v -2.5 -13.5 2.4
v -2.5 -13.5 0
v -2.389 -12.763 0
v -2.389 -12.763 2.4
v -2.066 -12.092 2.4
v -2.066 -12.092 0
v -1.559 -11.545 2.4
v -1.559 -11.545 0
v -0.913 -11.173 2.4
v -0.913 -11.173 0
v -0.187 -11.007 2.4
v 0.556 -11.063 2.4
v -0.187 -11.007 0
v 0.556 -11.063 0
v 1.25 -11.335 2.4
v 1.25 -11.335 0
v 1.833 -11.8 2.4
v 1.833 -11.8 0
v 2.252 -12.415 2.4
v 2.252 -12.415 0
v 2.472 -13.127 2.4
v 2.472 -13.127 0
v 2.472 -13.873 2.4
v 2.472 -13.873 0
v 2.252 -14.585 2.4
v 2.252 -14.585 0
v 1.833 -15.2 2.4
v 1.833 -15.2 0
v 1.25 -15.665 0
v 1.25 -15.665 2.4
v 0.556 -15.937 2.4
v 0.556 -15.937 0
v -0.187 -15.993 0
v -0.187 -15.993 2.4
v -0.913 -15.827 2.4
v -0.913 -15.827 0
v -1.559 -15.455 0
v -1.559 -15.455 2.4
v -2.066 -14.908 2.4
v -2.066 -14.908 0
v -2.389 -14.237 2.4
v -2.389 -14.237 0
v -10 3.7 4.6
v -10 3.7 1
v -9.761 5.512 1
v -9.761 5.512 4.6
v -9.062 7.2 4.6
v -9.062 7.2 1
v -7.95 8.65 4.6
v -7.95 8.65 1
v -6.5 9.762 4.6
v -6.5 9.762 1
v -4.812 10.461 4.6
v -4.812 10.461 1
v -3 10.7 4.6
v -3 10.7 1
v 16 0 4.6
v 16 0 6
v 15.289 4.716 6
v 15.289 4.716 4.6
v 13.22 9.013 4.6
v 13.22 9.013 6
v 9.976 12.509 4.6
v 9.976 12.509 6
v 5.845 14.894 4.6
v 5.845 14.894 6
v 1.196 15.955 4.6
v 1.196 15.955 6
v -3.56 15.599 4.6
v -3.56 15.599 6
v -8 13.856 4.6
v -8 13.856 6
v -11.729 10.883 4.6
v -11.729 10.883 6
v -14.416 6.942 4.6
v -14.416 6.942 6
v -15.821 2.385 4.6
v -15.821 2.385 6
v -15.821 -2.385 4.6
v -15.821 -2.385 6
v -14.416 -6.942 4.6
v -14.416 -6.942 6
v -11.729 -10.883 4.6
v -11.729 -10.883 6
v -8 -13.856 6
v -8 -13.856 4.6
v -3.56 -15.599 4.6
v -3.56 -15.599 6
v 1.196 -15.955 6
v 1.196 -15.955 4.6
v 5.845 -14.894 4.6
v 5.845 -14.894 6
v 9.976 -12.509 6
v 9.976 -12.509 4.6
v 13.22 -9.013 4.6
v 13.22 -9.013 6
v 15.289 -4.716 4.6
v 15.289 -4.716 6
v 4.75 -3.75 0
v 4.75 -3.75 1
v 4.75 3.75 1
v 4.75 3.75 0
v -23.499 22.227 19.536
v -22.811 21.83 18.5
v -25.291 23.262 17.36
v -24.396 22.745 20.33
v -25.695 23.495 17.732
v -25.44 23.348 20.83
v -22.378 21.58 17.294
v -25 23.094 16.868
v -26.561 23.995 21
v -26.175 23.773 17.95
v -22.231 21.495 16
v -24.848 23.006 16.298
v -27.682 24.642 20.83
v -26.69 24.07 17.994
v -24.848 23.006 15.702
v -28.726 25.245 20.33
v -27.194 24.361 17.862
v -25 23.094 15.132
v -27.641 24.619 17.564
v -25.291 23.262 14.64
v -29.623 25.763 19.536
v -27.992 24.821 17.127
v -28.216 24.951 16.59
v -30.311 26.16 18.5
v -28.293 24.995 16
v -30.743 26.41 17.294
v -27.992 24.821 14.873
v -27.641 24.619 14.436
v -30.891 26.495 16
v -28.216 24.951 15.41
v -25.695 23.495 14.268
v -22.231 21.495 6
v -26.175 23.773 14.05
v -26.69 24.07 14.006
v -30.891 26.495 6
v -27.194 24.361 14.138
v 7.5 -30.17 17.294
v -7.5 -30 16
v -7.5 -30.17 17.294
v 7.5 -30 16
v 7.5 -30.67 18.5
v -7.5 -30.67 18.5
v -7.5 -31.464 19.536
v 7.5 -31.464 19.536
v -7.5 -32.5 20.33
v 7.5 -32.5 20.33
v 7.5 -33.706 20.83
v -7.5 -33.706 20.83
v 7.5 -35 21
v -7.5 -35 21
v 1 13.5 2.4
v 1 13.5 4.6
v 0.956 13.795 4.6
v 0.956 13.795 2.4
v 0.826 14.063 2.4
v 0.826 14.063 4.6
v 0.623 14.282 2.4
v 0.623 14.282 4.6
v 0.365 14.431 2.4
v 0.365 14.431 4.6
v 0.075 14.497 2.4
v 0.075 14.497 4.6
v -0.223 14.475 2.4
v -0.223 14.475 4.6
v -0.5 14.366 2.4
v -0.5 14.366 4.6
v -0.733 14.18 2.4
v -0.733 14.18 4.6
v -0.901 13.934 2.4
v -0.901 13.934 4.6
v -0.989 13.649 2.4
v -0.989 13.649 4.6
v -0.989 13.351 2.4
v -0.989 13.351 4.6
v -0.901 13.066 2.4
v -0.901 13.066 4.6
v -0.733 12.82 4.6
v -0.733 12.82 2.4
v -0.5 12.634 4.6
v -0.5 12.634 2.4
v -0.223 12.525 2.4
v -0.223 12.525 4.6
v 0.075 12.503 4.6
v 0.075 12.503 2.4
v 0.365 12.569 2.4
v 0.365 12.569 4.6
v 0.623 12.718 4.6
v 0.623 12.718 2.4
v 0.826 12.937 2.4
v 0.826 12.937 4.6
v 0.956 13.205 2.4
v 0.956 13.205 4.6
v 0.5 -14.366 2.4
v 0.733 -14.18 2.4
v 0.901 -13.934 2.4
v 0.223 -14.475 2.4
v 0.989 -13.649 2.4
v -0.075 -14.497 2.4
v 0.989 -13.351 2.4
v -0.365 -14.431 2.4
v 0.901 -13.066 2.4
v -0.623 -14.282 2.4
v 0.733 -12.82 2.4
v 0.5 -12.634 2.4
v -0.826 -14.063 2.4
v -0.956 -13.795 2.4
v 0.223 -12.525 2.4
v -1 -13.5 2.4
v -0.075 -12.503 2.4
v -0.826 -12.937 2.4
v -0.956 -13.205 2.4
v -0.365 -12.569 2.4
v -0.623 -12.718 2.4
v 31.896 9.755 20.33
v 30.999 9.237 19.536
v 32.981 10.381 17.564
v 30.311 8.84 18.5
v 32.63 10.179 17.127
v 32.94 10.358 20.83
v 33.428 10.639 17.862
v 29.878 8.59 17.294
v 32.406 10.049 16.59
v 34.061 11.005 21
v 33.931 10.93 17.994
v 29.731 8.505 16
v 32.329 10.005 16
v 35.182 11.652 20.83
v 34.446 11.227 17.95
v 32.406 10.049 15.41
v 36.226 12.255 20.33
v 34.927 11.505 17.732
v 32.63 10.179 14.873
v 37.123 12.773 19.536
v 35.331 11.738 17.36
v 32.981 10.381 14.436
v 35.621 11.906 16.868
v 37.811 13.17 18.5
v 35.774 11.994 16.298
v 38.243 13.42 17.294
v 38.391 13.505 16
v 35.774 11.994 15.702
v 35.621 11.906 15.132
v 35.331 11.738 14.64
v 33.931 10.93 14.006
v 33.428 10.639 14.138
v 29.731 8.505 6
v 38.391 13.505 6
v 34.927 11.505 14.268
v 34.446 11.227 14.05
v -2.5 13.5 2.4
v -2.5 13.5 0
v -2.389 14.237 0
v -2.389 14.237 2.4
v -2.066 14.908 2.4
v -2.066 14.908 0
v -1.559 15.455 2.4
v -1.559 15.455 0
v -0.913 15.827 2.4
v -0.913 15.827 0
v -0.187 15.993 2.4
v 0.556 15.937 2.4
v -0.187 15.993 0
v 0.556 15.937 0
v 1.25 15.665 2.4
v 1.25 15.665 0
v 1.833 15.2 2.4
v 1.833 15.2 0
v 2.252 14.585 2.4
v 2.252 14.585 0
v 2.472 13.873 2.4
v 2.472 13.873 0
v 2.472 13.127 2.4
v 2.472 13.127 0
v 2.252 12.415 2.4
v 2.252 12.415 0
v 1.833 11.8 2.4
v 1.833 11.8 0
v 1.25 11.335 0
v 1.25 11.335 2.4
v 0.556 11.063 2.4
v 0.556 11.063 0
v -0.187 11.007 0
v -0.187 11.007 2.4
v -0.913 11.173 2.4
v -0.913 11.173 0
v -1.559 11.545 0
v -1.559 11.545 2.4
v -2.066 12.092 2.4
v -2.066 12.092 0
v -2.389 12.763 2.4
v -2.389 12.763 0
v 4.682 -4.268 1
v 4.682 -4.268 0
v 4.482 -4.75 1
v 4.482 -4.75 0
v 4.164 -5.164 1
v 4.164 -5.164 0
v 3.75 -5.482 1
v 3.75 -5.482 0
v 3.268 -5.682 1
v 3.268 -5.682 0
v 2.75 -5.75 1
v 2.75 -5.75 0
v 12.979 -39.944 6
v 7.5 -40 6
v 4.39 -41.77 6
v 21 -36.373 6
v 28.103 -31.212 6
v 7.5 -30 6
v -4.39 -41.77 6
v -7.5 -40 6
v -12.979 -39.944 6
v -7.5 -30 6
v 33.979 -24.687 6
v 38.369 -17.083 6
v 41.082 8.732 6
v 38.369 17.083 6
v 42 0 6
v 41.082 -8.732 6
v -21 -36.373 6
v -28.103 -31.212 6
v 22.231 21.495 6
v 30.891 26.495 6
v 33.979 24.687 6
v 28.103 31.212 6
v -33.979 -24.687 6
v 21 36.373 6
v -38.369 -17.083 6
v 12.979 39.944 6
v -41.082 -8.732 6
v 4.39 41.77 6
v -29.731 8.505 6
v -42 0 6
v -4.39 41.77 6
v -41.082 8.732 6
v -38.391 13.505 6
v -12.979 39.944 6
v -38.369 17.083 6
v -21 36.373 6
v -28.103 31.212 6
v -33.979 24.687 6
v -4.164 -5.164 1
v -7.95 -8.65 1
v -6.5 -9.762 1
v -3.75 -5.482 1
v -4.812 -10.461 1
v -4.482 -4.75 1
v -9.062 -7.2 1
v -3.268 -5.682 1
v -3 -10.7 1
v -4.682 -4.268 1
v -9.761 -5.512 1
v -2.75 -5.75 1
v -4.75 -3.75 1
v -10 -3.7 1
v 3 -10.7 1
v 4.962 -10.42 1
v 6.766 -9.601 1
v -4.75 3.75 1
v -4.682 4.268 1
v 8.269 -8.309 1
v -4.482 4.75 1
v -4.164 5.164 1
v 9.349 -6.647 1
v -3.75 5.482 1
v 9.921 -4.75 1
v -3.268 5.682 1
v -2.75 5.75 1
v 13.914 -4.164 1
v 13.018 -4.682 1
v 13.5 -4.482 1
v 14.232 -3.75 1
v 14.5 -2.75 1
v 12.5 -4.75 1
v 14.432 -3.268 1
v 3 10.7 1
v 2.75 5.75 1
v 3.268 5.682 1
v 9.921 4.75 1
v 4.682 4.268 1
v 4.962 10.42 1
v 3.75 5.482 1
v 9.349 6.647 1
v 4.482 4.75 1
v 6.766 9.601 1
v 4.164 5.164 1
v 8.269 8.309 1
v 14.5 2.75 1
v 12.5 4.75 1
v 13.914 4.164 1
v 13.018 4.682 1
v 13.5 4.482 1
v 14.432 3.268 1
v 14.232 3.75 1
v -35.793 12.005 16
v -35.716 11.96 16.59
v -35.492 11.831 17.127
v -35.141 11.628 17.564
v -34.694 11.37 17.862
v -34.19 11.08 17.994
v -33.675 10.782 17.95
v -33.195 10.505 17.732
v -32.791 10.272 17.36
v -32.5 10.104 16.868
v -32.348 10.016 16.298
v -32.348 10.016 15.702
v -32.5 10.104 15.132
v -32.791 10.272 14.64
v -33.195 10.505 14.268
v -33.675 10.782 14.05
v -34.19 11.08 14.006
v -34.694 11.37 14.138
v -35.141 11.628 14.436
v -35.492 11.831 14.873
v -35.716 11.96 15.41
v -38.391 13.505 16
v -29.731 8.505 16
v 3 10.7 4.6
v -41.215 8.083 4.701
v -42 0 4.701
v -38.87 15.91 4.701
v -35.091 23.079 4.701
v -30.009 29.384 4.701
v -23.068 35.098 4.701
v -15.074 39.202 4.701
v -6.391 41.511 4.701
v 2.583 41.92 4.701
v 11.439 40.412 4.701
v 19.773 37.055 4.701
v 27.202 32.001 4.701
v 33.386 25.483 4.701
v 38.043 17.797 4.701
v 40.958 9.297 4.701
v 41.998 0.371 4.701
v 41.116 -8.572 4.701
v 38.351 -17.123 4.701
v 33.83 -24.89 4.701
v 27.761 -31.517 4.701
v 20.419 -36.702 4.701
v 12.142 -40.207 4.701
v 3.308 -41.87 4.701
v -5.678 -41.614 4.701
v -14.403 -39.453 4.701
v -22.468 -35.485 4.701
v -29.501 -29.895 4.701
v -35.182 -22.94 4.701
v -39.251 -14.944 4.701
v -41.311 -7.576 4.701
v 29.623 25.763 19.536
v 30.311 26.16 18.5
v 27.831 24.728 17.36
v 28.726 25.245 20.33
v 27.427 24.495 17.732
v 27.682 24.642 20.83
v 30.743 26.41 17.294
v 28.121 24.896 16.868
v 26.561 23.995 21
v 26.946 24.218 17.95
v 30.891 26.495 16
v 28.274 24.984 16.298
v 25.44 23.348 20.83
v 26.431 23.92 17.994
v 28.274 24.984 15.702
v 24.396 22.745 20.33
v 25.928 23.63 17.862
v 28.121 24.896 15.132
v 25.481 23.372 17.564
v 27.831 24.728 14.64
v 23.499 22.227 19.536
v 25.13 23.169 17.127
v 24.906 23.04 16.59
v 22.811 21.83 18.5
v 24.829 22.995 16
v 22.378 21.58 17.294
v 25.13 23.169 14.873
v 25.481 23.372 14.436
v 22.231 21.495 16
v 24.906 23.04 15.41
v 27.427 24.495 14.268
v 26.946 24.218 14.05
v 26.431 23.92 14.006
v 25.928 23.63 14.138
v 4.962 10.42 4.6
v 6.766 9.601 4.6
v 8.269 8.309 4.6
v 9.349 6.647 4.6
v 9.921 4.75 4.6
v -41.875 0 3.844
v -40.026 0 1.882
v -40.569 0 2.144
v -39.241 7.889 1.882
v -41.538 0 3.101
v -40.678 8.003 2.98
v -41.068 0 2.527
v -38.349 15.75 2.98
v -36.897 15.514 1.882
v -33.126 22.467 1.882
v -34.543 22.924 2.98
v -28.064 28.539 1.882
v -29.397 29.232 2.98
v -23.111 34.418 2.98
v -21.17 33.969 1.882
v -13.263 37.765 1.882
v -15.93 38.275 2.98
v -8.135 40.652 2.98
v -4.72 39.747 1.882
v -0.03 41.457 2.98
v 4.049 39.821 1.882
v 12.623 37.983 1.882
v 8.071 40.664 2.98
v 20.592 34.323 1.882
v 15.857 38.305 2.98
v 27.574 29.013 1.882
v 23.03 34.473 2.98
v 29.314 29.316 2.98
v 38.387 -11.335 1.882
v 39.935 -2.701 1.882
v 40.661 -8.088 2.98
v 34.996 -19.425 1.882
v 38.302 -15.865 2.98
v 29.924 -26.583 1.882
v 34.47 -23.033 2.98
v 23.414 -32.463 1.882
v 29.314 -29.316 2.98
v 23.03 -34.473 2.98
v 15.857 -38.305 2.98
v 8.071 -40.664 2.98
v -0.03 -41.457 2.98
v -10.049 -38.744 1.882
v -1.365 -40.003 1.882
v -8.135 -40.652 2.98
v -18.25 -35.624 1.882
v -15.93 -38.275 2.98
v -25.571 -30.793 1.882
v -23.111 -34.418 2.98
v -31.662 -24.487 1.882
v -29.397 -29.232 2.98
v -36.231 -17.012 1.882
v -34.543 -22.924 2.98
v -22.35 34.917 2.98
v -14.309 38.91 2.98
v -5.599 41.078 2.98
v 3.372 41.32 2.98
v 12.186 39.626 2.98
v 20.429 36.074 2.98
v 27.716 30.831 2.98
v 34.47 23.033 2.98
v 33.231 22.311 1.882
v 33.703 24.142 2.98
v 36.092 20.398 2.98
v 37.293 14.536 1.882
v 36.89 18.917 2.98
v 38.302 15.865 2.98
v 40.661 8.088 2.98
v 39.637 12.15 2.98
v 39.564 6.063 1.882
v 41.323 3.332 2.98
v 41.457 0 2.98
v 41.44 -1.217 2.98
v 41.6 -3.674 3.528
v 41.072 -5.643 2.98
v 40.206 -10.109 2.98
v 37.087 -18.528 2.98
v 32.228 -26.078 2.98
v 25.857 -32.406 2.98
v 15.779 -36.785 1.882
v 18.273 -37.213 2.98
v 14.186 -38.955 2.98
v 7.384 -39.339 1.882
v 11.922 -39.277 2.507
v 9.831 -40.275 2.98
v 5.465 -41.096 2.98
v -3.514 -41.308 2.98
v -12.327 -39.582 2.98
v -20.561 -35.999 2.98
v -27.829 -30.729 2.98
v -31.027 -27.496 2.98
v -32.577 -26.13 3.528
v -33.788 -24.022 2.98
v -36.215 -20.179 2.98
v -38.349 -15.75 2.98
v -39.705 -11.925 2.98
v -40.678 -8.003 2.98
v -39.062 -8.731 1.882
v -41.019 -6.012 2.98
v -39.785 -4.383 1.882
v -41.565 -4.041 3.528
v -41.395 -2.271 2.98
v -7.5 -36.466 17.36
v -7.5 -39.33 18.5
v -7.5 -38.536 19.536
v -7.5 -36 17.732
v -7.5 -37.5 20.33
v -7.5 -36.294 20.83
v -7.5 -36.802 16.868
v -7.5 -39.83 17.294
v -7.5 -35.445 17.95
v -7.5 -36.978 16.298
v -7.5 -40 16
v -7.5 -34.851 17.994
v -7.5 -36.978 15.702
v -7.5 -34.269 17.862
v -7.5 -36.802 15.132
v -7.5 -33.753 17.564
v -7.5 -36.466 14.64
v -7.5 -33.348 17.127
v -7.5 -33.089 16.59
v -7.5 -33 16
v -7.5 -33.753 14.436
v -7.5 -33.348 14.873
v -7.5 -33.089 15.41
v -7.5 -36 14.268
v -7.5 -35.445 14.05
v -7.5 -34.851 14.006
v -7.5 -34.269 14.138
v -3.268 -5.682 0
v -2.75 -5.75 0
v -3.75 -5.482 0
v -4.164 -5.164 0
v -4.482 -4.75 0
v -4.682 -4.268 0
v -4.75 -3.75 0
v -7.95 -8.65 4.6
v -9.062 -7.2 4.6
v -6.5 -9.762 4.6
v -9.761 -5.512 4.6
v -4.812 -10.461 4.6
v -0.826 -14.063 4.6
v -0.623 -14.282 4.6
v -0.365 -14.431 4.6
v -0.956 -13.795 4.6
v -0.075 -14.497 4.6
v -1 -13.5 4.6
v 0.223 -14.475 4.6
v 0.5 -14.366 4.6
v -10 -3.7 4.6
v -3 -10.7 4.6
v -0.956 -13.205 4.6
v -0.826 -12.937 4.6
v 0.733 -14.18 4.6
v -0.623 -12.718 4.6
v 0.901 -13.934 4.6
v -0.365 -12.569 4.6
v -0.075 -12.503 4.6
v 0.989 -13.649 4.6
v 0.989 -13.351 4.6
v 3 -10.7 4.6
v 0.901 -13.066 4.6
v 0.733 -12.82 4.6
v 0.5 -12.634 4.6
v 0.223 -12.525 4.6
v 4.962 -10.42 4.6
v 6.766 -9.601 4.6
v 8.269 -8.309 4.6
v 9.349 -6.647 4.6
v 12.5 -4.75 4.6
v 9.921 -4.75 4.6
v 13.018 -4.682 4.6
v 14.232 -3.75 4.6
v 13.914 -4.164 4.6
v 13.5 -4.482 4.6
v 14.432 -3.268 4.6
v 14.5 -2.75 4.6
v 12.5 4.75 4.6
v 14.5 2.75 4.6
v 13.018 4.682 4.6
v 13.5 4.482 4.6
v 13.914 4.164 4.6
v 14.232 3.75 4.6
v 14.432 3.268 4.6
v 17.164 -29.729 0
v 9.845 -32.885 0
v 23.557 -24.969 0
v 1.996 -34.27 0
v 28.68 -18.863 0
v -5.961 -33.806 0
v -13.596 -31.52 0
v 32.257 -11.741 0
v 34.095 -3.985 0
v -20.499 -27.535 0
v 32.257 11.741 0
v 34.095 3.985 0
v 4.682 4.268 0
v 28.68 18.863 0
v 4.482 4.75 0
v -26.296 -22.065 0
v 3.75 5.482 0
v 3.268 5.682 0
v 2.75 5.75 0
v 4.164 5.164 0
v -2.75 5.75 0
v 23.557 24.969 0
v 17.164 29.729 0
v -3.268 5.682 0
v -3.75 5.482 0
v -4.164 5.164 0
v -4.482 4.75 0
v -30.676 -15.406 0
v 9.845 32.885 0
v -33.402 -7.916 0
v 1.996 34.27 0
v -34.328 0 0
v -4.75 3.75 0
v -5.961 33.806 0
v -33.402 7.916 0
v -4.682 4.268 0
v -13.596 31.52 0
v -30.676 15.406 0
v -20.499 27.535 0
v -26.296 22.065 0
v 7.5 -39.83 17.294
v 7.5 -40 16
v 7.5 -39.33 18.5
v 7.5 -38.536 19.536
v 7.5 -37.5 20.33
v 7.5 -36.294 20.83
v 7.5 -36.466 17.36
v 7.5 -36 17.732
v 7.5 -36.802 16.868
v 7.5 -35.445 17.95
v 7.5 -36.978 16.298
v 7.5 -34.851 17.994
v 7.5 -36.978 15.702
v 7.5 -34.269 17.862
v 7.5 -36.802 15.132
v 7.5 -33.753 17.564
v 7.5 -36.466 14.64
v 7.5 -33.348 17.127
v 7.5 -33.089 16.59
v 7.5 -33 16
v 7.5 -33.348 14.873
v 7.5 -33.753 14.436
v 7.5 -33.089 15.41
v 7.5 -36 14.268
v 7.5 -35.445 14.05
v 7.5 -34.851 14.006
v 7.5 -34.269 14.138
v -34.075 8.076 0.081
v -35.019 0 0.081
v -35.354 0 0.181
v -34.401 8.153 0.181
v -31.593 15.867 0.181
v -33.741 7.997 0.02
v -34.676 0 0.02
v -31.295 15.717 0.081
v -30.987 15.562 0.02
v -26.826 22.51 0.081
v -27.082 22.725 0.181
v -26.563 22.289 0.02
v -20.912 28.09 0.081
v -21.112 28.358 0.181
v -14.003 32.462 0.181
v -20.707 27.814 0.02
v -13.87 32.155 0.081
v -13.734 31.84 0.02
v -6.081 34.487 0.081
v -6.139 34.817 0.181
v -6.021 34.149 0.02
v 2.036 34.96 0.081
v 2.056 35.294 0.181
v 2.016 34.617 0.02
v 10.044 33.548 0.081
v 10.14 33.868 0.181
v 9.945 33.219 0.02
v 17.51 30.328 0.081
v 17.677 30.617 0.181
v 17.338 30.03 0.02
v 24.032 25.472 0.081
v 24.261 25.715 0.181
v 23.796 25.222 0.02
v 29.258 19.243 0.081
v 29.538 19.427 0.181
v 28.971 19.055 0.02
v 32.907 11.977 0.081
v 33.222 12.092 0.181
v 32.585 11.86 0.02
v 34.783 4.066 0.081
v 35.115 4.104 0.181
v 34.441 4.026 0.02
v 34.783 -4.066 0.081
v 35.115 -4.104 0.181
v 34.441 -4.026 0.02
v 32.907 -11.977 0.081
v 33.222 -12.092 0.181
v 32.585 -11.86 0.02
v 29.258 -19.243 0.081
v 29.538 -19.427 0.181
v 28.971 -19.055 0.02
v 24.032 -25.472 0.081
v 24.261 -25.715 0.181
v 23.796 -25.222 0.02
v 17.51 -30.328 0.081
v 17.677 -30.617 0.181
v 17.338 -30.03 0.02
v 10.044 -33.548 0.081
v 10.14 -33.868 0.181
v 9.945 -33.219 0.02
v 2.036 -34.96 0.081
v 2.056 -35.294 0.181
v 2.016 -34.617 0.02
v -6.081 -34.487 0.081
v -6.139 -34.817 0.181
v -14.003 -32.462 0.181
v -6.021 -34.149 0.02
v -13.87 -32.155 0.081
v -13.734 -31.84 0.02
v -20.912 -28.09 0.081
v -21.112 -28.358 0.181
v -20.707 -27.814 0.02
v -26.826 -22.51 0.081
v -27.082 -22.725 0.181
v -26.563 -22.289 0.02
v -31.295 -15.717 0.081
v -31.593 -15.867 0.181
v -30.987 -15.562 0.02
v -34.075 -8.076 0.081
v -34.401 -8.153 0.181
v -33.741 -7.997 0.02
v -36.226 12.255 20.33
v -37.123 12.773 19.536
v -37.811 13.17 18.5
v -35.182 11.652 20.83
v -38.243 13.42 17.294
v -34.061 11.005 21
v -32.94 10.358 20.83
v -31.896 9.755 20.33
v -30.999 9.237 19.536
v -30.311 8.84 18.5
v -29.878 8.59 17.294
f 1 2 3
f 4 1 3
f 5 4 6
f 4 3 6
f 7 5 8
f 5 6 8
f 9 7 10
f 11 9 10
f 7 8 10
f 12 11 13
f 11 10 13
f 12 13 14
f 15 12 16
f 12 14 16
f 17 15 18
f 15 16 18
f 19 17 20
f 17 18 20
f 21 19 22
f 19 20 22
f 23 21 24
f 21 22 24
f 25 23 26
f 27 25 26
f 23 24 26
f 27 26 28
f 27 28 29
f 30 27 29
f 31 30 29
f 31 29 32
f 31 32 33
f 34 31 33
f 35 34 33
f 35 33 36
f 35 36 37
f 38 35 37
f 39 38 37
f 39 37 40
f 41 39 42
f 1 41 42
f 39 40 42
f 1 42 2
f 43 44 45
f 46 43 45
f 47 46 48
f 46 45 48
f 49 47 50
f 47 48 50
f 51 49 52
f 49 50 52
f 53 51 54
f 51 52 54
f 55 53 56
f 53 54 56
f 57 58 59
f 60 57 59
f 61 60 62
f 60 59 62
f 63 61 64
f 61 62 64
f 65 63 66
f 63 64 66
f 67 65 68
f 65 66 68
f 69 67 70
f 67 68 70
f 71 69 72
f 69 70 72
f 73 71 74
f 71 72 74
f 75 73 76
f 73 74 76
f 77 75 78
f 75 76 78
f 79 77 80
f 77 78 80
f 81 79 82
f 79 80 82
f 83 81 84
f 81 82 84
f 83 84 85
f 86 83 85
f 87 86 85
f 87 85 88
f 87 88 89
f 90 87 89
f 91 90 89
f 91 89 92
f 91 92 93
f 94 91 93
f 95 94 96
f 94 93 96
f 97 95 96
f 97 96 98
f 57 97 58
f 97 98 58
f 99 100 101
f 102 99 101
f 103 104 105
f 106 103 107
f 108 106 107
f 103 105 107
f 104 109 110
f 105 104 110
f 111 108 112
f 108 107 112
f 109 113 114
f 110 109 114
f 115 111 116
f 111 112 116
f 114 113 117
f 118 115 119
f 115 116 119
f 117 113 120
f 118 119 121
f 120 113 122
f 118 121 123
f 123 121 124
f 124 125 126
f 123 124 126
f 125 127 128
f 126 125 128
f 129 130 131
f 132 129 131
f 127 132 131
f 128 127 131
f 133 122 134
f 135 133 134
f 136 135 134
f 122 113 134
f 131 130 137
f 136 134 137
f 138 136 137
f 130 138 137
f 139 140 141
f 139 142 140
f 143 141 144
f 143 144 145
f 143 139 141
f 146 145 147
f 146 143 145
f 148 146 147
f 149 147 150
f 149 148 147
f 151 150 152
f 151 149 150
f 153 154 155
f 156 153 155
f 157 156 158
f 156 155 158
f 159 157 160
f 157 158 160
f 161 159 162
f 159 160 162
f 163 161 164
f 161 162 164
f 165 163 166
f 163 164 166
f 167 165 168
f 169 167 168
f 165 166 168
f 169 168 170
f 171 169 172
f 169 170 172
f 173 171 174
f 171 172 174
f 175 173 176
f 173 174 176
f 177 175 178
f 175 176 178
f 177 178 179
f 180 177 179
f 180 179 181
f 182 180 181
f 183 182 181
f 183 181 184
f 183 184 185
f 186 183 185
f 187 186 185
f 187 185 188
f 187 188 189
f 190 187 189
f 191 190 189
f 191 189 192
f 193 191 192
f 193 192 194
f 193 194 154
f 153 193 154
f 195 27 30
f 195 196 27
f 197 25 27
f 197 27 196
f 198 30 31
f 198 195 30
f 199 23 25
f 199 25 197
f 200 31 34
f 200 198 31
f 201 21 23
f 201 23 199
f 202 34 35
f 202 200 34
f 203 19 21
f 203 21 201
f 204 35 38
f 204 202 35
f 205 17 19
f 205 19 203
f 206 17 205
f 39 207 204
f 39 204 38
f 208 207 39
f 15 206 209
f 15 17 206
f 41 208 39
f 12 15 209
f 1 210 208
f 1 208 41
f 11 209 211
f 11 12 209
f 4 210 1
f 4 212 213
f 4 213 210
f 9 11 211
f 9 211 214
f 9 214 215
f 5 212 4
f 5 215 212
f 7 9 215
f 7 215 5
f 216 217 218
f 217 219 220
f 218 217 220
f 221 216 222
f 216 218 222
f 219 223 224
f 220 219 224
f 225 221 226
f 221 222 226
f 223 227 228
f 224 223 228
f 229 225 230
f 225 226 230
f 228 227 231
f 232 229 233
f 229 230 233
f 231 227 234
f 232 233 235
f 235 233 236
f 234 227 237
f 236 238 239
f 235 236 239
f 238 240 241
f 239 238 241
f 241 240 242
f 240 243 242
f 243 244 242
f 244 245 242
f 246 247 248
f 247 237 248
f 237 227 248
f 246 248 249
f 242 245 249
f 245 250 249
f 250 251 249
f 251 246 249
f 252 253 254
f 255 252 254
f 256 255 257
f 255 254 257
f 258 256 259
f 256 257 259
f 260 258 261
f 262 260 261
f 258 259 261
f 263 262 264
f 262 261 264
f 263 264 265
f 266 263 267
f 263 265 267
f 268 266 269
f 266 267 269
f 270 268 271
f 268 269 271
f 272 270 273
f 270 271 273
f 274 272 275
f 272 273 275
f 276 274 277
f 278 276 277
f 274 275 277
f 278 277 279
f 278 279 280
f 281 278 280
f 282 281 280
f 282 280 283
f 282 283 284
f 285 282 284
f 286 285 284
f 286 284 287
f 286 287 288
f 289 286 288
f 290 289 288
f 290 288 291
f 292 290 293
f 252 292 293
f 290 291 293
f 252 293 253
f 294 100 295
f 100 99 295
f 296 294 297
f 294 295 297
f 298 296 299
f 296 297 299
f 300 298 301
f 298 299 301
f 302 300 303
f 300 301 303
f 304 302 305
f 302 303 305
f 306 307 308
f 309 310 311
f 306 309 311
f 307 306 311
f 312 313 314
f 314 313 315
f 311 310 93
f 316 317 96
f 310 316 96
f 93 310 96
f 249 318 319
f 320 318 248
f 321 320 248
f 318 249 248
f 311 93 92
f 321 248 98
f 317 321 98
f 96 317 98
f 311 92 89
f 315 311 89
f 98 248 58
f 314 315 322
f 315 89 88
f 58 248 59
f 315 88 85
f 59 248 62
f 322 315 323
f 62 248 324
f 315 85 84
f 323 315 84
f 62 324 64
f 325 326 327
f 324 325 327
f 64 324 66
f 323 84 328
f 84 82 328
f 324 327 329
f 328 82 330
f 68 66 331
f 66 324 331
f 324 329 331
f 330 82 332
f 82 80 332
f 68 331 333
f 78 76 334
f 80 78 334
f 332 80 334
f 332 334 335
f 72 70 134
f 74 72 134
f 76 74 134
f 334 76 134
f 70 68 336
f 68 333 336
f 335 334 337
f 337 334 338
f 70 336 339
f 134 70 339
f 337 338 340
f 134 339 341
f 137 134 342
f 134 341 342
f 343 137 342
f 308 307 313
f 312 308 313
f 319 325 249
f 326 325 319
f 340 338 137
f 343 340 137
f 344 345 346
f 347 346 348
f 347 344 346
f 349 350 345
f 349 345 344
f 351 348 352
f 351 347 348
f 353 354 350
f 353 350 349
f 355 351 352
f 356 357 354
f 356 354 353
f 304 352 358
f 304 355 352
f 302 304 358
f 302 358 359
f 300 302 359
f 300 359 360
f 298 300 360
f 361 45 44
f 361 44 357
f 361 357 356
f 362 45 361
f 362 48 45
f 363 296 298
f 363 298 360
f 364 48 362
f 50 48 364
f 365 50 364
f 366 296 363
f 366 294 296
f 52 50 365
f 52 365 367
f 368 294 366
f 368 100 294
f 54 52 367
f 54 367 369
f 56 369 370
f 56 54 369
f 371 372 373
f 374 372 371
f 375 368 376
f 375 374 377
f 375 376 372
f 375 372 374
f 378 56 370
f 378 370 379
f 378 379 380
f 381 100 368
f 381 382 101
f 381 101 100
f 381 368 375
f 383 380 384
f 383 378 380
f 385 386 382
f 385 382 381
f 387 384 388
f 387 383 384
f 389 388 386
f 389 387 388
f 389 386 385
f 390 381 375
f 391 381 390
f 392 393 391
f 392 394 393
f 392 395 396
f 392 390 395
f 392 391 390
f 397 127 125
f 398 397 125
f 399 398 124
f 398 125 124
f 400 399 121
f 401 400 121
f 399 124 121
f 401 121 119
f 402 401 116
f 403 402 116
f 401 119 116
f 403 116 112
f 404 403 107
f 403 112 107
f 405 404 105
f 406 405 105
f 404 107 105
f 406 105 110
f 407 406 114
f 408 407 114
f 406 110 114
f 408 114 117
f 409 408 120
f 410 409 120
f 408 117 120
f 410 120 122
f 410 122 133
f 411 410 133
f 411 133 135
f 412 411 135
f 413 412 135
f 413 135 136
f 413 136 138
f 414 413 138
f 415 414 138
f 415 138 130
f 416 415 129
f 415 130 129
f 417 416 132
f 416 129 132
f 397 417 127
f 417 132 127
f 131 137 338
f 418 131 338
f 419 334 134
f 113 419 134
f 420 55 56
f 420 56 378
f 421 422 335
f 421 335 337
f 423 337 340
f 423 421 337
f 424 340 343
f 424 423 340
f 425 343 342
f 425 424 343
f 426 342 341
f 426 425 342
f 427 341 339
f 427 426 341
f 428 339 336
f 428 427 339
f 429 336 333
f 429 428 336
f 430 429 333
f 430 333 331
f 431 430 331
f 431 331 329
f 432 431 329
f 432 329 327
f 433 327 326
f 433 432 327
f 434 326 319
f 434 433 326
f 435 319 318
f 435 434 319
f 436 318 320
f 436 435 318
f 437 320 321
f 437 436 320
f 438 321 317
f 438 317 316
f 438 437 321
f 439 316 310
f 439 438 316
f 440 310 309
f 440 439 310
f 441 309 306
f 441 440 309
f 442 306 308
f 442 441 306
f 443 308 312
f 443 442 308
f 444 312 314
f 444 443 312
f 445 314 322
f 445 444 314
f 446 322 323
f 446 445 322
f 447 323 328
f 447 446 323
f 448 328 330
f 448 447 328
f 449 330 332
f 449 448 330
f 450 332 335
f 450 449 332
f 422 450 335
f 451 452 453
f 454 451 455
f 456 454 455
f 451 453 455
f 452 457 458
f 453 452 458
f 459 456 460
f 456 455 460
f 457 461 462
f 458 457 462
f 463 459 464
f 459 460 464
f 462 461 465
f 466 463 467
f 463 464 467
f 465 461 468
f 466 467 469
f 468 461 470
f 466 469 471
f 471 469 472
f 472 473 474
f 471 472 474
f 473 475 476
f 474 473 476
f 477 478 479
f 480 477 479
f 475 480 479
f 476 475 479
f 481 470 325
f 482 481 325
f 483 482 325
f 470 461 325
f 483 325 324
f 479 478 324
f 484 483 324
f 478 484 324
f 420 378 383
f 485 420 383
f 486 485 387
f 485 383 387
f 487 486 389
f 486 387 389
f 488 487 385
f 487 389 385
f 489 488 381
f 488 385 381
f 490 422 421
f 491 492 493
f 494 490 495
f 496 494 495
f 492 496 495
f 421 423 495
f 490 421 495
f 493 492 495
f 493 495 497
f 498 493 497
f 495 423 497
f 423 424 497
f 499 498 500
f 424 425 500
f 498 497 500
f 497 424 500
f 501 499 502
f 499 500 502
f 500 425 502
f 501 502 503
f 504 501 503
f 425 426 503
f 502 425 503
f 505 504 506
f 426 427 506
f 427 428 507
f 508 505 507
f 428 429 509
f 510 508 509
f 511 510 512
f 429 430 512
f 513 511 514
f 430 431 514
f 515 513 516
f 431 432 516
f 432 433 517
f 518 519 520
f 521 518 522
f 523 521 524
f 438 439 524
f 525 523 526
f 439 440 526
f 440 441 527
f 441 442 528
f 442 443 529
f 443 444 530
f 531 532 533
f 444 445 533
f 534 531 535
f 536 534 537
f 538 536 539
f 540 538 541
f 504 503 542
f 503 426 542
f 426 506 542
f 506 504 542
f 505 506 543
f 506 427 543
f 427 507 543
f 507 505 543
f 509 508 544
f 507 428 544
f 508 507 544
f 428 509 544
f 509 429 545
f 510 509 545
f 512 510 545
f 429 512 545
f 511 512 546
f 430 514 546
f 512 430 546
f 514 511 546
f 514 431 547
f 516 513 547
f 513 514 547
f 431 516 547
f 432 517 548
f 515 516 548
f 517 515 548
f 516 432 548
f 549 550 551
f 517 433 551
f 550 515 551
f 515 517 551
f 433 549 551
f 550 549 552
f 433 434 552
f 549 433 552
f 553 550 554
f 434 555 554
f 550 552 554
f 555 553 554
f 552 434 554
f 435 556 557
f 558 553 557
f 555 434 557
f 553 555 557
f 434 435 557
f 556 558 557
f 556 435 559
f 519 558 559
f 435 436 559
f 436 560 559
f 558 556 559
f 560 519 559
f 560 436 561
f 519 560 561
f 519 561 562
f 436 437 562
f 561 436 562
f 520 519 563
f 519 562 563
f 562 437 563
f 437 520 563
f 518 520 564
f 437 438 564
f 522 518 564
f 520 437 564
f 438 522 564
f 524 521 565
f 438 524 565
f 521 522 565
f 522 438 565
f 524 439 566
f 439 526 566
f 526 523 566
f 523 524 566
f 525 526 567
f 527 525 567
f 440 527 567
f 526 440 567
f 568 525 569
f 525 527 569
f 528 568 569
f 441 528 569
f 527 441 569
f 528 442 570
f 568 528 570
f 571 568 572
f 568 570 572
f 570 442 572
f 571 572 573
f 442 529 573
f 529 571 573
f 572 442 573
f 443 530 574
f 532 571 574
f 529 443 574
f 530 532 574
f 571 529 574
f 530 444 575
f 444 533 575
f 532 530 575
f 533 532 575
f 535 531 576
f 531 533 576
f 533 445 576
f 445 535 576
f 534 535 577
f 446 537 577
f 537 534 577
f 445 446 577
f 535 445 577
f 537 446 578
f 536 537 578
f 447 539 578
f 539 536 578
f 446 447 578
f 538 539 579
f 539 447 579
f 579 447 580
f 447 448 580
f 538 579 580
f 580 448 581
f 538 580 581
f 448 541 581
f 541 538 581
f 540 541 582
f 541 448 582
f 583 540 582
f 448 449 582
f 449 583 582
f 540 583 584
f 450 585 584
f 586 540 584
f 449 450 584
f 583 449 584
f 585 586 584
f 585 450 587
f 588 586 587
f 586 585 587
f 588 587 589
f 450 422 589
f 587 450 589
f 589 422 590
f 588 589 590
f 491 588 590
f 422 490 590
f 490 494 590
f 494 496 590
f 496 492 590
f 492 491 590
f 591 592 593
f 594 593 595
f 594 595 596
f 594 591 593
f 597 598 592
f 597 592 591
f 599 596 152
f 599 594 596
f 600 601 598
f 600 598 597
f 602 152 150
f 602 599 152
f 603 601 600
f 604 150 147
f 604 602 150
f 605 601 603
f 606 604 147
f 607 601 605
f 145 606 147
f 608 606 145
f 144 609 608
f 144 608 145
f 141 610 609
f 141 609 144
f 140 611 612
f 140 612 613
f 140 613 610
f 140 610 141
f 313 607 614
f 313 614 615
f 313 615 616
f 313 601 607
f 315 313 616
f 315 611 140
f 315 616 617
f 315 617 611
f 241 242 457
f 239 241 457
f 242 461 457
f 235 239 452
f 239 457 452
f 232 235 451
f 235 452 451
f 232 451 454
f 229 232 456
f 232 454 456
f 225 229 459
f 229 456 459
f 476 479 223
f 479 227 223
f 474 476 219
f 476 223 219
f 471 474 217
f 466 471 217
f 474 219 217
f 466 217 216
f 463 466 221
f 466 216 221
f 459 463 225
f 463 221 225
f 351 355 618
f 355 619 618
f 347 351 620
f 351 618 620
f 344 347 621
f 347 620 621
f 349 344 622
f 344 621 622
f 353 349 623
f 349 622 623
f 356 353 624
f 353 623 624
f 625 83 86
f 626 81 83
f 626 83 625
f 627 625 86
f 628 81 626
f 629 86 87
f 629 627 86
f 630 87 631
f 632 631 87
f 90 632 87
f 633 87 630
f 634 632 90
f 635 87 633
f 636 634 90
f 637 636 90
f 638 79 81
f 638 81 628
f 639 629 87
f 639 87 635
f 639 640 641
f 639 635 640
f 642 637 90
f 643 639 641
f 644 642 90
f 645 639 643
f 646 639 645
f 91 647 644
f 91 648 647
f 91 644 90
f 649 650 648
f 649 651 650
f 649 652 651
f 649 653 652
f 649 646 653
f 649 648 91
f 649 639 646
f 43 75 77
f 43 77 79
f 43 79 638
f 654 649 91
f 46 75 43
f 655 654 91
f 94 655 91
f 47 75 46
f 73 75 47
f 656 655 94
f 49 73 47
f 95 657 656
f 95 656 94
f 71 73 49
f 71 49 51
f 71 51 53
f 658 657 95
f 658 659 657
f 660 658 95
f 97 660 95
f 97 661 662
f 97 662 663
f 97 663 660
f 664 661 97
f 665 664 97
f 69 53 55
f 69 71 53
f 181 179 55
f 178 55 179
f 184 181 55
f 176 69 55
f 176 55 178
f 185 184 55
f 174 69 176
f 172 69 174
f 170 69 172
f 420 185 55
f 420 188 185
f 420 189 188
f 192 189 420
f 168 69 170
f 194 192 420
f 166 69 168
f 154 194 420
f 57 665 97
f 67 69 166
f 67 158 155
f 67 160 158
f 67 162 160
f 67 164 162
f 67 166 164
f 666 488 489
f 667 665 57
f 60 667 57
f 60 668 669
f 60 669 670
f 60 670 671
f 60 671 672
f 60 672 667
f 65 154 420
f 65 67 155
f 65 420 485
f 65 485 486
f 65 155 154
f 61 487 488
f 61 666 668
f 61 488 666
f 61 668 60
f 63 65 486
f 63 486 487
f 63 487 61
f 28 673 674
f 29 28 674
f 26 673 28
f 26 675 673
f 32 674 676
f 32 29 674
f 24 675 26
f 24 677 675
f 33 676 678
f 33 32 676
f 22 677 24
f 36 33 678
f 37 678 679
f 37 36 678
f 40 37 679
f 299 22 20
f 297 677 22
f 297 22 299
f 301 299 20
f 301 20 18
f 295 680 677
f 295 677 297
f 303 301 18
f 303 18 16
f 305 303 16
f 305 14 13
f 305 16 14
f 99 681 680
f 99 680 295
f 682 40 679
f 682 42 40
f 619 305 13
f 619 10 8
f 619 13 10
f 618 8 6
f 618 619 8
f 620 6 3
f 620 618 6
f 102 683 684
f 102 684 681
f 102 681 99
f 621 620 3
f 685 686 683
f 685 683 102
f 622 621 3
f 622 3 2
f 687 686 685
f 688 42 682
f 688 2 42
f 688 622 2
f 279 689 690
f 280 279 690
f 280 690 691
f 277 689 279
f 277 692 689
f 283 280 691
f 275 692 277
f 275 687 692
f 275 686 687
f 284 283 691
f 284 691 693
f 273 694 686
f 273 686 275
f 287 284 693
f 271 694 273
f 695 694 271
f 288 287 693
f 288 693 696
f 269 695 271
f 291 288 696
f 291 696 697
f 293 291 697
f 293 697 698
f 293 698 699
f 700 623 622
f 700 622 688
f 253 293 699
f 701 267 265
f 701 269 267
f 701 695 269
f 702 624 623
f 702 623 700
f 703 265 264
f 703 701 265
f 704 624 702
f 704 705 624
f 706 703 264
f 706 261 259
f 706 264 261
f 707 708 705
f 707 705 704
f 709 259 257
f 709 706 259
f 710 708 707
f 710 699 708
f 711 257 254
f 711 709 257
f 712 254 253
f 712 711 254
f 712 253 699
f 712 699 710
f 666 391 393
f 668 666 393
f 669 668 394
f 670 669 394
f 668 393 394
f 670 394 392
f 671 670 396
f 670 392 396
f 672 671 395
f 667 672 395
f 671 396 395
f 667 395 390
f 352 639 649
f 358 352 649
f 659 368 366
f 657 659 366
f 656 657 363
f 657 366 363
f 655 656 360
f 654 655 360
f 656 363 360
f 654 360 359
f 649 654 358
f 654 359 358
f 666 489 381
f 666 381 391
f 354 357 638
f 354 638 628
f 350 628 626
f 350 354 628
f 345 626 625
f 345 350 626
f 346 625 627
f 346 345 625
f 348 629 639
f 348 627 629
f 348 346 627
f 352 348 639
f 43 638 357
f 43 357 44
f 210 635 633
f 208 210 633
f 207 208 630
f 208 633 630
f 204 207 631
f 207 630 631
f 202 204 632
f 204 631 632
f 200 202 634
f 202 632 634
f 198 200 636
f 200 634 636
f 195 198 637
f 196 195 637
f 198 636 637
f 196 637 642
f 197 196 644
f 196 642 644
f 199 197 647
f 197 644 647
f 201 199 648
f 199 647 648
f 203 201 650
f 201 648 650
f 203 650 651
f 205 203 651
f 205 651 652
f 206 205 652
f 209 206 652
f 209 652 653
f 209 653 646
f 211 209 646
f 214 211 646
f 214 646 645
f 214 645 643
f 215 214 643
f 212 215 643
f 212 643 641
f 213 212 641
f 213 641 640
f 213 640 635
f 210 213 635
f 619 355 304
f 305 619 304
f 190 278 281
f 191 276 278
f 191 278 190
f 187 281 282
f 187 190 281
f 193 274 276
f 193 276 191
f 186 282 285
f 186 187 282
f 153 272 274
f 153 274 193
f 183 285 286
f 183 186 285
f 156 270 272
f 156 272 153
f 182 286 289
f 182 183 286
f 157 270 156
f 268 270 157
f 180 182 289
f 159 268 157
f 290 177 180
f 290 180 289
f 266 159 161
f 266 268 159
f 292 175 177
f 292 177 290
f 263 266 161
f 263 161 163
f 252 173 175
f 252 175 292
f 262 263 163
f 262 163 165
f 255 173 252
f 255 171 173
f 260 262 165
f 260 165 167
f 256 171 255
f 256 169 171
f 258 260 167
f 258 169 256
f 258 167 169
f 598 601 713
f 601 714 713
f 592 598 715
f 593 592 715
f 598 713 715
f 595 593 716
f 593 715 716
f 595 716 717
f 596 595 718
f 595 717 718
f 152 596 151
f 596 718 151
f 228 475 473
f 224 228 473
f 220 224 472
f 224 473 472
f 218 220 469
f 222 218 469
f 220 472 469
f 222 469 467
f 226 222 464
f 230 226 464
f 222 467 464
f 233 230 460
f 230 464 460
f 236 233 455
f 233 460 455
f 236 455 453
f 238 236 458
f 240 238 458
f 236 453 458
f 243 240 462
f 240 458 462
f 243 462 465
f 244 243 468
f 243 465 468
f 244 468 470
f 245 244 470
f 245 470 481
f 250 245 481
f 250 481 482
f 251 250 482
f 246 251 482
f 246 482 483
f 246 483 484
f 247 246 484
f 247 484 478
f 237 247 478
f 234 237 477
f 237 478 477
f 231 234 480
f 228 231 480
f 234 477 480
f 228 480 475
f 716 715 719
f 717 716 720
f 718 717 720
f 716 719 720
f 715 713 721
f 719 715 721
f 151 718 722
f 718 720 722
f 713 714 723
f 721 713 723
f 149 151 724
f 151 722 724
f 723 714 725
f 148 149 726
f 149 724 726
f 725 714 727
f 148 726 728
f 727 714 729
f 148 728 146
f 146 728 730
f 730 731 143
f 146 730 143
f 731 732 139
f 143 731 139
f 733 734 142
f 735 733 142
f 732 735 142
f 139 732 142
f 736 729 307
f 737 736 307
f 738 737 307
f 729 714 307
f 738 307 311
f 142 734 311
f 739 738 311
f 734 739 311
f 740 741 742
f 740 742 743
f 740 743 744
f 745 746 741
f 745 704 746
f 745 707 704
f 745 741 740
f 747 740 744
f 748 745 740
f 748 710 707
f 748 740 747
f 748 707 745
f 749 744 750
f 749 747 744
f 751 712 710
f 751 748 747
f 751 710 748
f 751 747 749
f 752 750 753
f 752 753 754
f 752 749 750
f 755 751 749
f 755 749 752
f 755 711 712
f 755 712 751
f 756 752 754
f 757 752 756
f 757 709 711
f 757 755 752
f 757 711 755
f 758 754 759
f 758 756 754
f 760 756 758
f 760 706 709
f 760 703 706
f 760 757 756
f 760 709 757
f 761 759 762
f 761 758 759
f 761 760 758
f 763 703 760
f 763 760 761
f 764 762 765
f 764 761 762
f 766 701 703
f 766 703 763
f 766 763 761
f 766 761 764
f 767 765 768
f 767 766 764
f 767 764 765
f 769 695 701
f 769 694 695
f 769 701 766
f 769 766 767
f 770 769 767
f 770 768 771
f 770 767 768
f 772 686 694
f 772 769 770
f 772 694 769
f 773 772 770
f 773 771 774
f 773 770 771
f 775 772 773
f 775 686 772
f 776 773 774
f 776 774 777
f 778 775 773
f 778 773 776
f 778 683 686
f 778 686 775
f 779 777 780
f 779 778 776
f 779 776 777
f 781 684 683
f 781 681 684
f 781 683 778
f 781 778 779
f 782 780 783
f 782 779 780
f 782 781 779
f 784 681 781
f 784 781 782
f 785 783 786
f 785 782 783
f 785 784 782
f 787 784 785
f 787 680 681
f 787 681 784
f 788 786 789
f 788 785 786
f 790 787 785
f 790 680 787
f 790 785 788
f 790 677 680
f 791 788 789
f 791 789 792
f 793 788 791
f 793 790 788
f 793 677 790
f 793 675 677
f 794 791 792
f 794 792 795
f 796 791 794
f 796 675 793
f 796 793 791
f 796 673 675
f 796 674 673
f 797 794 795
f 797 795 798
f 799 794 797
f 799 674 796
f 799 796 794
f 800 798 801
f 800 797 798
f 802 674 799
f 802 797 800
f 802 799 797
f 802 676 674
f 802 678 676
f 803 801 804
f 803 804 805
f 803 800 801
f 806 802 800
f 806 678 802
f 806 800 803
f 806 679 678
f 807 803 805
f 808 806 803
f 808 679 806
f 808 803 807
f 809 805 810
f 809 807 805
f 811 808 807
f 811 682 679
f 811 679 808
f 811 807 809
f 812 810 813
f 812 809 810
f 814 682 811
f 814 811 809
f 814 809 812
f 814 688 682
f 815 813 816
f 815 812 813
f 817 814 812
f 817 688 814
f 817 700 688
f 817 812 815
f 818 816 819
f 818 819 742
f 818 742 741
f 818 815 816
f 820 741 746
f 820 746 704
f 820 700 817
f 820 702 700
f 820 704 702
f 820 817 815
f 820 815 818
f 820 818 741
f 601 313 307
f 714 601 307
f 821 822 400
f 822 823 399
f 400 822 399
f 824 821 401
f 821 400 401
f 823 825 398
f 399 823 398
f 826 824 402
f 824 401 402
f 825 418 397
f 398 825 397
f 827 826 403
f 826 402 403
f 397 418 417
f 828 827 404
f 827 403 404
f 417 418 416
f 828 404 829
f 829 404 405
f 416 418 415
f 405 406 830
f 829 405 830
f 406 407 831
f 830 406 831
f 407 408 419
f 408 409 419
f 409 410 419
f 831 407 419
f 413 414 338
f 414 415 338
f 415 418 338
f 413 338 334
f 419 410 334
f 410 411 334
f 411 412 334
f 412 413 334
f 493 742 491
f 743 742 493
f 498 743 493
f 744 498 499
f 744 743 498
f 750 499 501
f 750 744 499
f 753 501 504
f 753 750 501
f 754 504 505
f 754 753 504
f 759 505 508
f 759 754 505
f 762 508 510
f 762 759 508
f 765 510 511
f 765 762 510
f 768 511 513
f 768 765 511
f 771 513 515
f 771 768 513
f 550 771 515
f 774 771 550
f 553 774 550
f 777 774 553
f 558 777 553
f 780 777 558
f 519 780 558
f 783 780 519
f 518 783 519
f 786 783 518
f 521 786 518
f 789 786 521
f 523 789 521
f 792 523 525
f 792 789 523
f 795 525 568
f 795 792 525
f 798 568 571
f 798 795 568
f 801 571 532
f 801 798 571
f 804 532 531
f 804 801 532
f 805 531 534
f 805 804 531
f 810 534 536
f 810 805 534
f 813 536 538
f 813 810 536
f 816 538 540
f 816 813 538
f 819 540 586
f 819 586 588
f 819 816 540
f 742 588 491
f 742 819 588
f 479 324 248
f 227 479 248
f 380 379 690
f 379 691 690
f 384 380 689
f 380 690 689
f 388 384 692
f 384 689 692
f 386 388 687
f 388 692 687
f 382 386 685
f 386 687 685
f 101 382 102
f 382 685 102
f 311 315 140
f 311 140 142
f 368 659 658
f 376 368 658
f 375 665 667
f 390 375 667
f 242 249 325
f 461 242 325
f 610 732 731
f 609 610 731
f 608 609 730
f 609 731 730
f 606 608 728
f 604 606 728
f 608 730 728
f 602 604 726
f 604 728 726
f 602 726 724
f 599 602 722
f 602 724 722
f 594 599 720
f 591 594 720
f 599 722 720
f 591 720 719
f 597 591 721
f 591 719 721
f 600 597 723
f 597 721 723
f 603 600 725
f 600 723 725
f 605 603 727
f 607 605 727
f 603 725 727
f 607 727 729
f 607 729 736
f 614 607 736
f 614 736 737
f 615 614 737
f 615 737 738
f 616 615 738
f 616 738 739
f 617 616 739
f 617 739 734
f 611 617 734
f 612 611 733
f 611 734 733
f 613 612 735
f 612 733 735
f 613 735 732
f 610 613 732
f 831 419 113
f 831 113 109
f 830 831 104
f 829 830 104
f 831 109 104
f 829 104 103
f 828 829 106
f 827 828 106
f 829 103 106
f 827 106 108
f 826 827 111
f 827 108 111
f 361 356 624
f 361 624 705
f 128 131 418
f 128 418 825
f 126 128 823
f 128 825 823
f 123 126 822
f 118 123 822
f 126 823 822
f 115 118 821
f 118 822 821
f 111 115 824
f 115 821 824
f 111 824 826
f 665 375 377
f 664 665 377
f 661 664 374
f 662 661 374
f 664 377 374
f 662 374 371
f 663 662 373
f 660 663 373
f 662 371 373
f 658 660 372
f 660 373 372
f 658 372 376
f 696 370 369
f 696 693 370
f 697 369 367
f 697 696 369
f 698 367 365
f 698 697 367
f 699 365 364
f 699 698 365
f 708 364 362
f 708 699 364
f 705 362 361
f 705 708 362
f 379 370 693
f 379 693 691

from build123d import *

# Parameters (mm, degrees)
BOSS_EXTRUDE1_DEPTH = 6
SKETCH3_R           = 3
CUT_EXTRUDE1_DEPTH  = 43.330607543
SKETCH8_W           = 20
SKETCH8_H           = 21.4
CUT_EXTRUDE5_DEPTH  = 5
FILLET8_R           = 7
SKETCH9_R           = 1
CUT_EXTRUDE6_DEPTH  = 43.330607543
SKETCH10_W          = 9.5
SKETCH10_H          = 11.5
CUT_EXTRUDE7_DEPTH  = 43.200477899
FILLET9_R           = 2
SKETCH11_W          = 5.5
SKETCH11_H          = 9.5
CUT_EXTRUDE8_DEPTH  = 5
FILLET10_R          = 2
SKETCH12_R          = 16
CUT_EXTRUDE9_DEPTH  = 1.4
SKETCH13_R          = 2.5
CUT_EXTRUDE10_DEPTH = 2.4
SKETCH14_R          = 42
BOSS_EXTRUDE3_DEPTH = 6
CHAMFER1_SIZE       = 2.6
CHAMFER1_SIZE2      = 7.143441291
FILLET12_R          = 3
SKETCH15_W          = 15
SKETCH15_H          = 10
BOSS_EXTRUDE4_DEPTH = 15
SKETCH16_R          = 2
CUT_EXTRUDE11_DEPTH = 15
SKETCH17_R          = 2
CUT_EXTRUDE12_DEPTH = 15
SKETCH18_R          = 2
CUT_EXTRUDE13_DEPTH = 15
FILLET13_R          = 5


with BuildPart() as part:
    # Sketch1 → Boss-Extrude1 (new body)
    with BuildSketch(Plane.XY):
        Polygon((-11.547005384, 20), (-5.63450733, 30.24074703), (5.63450733, 30.24074703), (5.773502692, 30), (23.094010768, 0), (29.006508822, -10.24074703), (23.372001492, -20), (23.094010768, -20), (-11.547005384, -20), (-23.372001492, -20), (-29.006508822, -10.24074703), (-28.867513459, -10), align=None)
    extrude(amount=BOSS_EXTRUDE1_DEPTH)

    # Sketch3 → Cut-Extrude1 (cut, through all)
    with BuildSketch(Plane.XY.offset(6)):
        Circle(SKETCH3_R)
    extrude(amount=-CUT_EXTRUDE1_DEPTH, mode=Mode.SUBTRACT)

    # Sketch8 → Cut-Extrude5 (cut)
    with BuildSketch(Plane.XY.offset(6)):
        Rectangle(SKETCH8_W, SKETCH8_H)
    extrude(amount=-CUT_EXTRUDE5_DEPTH, mode=Mode.SUBTRACT)

    # Fillet8
    fillet8_edges = [part.edges().sort_by_distance(p)[0] for p in [
        (10, 10.7, 3.5),
        (10, -10.7, 3.5),
        (-10, -10.7, 3.5),
        (-10, 10.7, 3.5),
    ]]
    fillet(fillet8_edges, radius=FILLET8_R)

    # Sketch9 → Cut-Extrude6 (cut, through all)
    with BuildSketch(Plane.XY.offset(6)):
        with Locations((0, 13.5)):
            Circle(SKETCH9_R)
        with Locations(Location((0, -13.5, 0), (0, 0, 180))):
            Circle(SKETCH9_R)
    extrude(amount=-CUT_EXTRUDE6_DEPTH, mode=Mode.SUBTRACT)

    # Sketch10 → Cut-Extrude7 (cut, through all)
    with BuildSketch(Plane.XY.offset(1)):
        Rectangle(SKETCH10_W, SKETCH10_H)
    extrude(amount=-CUT_EXTRUDE7_DEPTH, mode=Mode.SUBTRACT)

    # Fillet9
    fillet9_edges = [part.edges().sort_by_distance(p)[0] for p in [
        (4.75, 5.75, 0.5),
        (4.75, -5.75, 0.5),
        (-4.75, -5.75, 0.5),
        (-4.75, 5.75, 0.5),
    ]]
    fillet(fillet9_edges, radius=FILLET9_R)

    # Sketch11 → Cut-Extrude8 (cut)
    with BuildSketch(Plane.XY.offset(6)):
        with Locations((11.75, 0)):
            Rectangle(SKETCH11_W, SKETCH11_H)
    extrude(amount=-CUT_EXTRUDE8_DEPTH, mode=Mode.SUBTRACT)

    # Fillet10
    fillet10_edges = [part.edges().sort_by_distance(p)[0] for p in [
        (14.5, -4.75, 3.5),
        (14.5, 4.75, 3.5),
    ]]
    fillet(fillet10_edges, radius=FILLET10_R)

    # Sketch12 → Cut-Extrude9 (cut)
    with BuildSketch(Plane.XY.offset(6)):
        Circle(SKETCH12_R)
    extrude(amount=-CUT_EXTRUDE9_DEPTH, mode=Mode.SUBTRACT)

    # Sketch13 → Cut-Extrude10 (cut)
    with BuildSketch(Plane(origin=(0, 0, 0), x_dir=(-1, 0, 0), z_dir=(0, 0, -1))):
        with Locations((0, 13.5)):
            Circle(SKETCH13_R)
        with Locations((0, -13.5)):
            Circle(SKETCH13_R)
    extrude(amount=-CUT_EXTRUDE10_DEPTH, mode=Mode.SUBTRACT)

    # Sketch14 → Boss-Extrude3 (add)
    with BuildSketch(Plane(origin=(0, 0, 0), x_dir=(-1, 0, 0), z_dir=(0, 0, -1))):
        Circle(SKETCH14_R)
        Polygon((19.538701505, 0), (9.769350753, 16.921011861), (-9.769350753, 16.921011861), (-19.538701505, 0), (-9.769350753, -16.921011861), (9.769350753, -16.921011861), align=None, mode=Mode.SUBTRACT)
    extrude(amount=-BOSS_EXTRUDE3_DEPTH)

    # Chamfer1
    chamfer1_edges = [part.edges().sort_by_distance(p)[0] for p in [
        (42, 0, 0),
    ]]
    chamfer1_side = [part.faces().sort_by_distance(p)[0] for p in [
        (42, 0, 3),
    ]]
    chamfer(chamfer1_edges, length=CHAMFER1_SIZE, length2=CHAMFER1_SIZE2, reference=chamfer1_side[0])

    # Fillet12
    fillet12_edges = [part.edges().sort_by_distance(p)[0] for p in [
        (34.856558709, 0, 0),
        (42, 0, 2.6),
    ]]
    fillet(fillet12_edges, radius=FILLET12_R)

    # Sketch15 → Boss-Extrude4 (add)
    with BuildSketch(Plane.XY.offset(6)):
        Polygon((-29.730762114, 8.504809472), (-22.230762114, 21.495190528), (-30.891016151, 26.495190528), (-38.391016151, 13.504809472), align=None)
        with Locations((0, -35)):
            Rectangle(SKETCH15_W, SKETCH15_H)
        Polygon((22.230762114, 21.495190528), (29.730762114, 8.504809472), (38.391016151, 13.504809472), (30.891016151, 26.495190528), align=None)
    extrude(amount=BOSS_EXTRUDE4_DEPTH)

    # Sketch16 → Cut-Extrude11 (cut)
    with BuildSketch(Plane(origin=(-3.75, 6.495190528, 0), x_dir=(0.8660254037844431, 0.49999999999999234, 0), z_dir=(-0.4999999999999924, 0.8660254037844431, 0))):
        with Locations(Location((35, -16, 0), (0, 0, 180))):
            Circle(SKETCH16_R)
    extrude(amount=-CUT_EXTRUDE11_DEPTH, mode=Mode.SUBTRACT)

    # Sketch17 → Cut-Extrude12 (cut)
    with BuildSketch(Plane(origin=(7.5, 0, 0), x_dir=(0, 0, -1), z_dir=(1, 0, 0))):
        with Locations(Location((-16, -35, 0), (0, 0, 90))):
            Circle(SKETCH17_R)
    extrude(amount=-CUT_EXTRUDE12_DEPTH, mode=Mode.SUBTRACT)

    # Sketch18 → Cut-Extrude13 (cut)
    with BuildSketch(Plane(origin=(3.75, 6.495190528, 0), x_dir=(0.8660254037844364, -0.5000000000000041, 0), z_dir=(0.500000000000004, 0.8660254037844363, 0))):
        with Locations(Location((-35, -16, 0), (0, 0, 180))):
            Circle(SKETCH18_R)
    extrude(amount=-CUT_EXTRUDE13_DEPTH, mode=Mode.SUBTRACT)

    # Fillet13
    fillet13_edges = [part.edges().sort_by_distance(p)[0] for p in [
        (0, -40, 21),
        (0, -30, 21),
        (-34.641016151, 20, 21),
        (-25.980762114, 15, 21),
        (25.980762114, 15, 21),
        (34.641016151, 20, 21),
    ]]
    fillet(fillet13_edges, radius=FILLET13_R - 0.0001)  # a hair under: the kernel refuses the full size


solid = part.part
